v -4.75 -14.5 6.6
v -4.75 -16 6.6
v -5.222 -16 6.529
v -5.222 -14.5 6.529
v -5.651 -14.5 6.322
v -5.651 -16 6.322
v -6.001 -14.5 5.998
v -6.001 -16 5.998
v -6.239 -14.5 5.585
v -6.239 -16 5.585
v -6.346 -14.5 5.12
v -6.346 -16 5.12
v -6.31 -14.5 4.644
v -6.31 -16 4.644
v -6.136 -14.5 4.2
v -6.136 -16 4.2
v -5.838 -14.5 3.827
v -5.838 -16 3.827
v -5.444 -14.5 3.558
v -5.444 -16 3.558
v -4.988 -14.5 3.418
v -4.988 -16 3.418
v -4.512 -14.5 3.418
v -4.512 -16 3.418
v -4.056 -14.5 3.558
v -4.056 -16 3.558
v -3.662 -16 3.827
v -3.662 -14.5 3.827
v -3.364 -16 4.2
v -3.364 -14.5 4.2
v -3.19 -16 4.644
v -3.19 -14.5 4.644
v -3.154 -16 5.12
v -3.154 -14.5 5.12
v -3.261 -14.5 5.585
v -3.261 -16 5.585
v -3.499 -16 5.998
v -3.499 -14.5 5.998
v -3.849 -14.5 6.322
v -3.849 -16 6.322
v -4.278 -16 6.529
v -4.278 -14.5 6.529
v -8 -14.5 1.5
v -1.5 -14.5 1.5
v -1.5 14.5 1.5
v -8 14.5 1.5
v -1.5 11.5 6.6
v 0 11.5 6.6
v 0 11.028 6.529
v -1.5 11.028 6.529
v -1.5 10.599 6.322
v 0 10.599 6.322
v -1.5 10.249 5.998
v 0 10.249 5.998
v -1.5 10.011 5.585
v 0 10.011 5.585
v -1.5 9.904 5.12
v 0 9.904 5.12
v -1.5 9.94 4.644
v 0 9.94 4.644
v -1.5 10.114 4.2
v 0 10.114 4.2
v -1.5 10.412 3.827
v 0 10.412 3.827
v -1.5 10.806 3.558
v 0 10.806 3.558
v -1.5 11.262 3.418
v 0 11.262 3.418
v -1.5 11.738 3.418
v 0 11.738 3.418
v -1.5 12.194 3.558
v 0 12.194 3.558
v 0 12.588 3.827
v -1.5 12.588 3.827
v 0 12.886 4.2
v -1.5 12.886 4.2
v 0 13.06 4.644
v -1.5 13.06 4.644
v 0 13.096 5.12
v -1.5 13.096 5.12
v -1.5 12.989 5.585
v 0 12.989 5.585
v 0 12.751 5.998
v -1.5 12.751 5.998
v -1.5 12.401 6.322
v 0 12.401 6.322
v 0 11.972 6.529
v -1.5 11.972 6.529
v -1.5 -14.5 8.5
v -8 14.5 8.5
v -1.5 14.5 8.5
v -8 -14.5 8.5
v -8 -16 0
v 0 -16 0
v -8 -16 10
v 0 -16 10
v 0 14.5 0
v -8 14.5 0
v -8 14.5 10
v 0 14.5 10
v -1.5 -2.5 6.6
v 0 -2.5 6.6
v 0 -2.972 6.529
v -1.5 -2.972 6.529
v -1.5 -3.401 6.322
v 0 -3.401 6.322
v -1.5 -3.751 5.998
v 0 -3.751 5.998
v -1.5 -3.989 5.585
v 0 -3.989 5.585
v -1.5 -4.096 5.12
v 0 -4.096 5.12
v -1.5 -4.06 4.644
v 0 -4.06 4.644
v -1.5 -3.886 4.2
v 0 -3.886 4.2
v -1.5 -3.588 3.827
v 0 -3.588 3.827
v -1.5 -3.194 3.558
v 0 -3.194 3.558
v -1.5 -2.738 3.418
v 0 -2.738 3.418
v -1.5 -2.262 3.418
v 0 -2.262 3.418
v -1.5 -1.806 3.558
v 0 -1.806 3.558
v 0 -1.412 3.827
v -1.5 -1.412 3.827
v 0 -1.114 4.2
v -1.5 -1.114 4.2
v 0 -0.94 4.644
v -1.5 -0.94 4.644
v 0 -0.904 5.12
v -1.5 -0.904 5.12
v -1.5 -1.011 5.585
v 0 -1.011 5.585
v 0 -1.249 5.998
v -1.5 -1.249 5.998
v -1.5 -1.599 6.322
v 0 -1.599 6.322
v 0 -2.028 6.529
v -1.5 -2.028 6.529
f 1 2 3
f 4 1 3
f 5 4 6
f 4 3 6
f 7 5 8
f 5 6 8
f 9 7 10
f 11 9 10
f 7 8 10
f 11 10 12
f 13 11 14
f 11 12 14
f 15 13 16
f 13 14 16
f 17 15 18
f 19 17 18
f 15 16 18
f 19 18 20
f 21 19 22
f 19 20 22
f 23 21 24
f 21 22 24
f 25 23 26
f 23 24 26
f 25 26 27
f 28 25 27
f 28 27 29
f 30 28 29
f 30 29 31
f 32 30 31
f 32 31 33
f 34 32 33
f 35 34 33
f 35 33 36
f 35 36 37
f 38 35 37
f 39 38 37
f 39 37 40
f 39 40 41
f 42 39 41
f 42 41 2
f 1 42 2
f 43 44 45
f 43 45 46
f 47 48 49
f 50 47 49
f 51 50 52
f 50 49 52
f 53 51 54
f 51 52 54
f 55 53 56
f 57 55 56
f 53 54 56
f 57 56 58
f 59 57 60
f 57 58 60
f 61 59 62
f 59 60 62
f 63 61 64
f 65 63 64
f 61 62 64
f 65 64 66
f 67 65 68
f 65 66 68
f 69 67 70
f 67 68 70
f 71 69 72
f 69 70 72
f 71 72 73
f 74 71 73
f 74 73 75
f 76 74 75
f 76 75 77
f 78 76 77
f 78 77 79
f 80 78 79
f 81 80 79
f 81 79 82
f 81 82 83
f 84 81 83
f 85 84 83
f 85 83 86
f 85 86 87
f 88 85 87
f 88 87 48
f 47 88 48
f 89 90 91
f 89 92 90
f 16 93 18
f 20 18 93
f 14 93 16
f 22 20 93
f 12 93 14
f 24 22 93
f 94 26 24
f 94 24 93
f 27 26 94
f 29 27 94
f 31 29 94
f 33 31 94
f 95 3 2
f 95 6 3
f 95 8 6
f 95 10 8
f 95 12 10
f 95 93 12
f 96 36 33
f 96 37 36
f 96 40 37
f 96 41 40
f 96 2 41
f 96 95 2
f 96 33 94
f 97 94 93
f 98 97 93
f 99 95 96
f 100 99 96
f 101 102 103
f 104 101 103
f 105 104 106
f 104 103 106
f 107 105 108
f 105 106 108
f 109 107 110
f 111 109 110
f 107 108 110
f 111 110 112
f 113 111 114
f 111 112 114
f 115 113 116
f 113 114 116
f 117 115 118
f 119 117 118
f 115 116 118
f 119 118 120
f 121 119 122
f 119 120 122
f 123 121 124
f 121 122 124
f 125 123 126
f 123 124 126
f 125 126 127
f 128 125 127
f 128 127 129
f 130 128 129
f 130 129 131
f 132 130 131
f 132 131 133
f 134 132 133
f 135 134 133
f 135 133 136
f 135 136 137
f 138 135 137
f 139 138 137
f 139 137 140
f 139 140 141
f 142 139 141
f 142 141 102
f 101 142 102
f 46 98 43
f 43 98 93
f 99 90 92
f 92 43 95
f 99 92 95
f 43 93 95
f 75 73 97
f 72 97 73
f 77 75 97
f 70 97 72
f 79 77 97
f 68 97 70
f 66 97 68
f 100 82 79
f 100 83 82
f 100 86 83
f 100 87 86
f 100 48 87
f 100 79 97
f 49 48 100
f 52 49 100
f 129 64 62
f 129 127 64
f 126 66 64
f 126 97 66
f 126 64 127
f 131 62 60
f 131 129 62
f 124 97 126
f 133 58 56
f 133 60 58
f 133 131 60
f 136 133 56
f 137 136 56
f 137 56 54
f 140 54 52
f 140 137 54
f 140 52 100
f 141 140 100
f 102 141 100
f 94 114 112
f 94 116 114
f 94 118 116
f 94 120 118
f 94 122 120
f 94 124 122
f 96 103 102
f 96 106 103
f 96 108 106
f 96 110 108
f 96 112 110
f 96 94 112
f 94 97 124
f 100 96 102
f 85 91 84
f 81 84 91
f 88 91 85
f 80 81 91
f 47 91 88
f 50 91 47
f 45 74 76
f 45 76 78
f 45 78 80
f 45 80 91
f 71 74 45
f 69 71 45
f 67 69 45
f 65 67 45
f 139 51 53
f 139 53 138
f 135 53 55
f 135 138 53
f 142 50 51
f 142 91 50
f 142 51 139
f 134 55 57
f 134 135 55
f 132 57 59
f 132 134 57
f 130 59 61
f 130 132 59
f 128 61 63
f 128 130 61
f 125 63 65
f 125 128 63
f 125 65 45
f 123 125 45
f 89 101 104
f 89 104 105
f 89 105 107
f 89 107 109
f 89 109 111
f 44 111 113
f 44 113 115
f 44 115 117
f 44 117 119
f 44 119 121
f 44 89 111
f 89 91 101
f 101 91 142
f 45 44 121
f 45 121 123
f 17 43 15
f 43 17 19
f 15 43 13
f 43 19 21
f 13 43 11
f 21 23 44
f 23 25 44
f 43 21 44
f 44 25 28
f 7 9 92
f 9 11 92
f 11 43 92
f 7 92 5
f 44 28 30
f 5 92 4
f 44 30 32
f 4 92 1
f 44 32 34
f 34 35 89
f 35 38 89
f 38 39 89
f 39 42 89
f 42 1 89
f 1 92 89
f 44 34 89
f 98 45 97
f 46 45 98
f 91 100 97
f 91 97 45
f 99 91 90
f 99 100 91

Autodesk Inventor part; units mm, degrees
ref_plane "YZ Plane" through (0, 0, 0) normal (1, 0, 0) x (0, 1, 0)
ref_plane "XZ Plane" through (0, 0, 0) normal (0, 1, 0) x (-1, 0, 0)
ref_plane "XY Plane" through (0, 0, 0) normal (0, 0, 1) x (1, 0, 0)
sketch "Náčrt1" plane through (0, 0, 0) normal (0, 1, 0) x (-1, 0, 0)
  line L0 (0, -2) -> (0, 12) projected
  line L1 (-1.6, 0) -> (9.6, 0) projected
  line L2 (8, 10) -> (0, 10)
  line L3 (0, 10) -> (0, 0)
  line L4 (0, 0) -> (8, 0)
  line L5 (8, 0) -> (8, 10)
  line L6 (8, 8.5) -> (1.5, 8.5)
  line L7 (1.5, 8.5) -> (1.5, 1.5)
  line L8 (1.5, 1.5) -> (8, 1.5)
  line L9 (8, 1.5) -> (8, 8.5)
  point P0 (0, 0)
  point P1 (0, 10)
  dimension "d0" = 8
  dimension "d1" = 10
  dimension "d2" = 6.5
  dimension "d3" = 7
  dimension "d4" = 1.5
extrude "Vysunutí1" add sketch "Náčrt1" along normal mid plane 29 contours L0 L2 L5 L6 L7 L8 L1
sketch "Náčrt2" plane through (0, -14.5, 0) normal (0, -1, 0) x (1, 0, 0)
  line L0 (-8, 8.5) -> (-1.5, 8.5) projected
  line L1 (-1.5, 8.5) -> (-1.5, 1.5) projected
  line L2 (-1.5, 1.5) -> (-8, 1.5) projected
  line L3 (-8, 1.5) -> (-8, 0) projected
  line L4 (-8, 0) -> (0, 0) projected
  line L5 (0, 0) -> (0, 10) projected
  line L6 (0, 10) -> (-8, 10) projected
  line L7 (-8, 10) -> (-8, 8.5) projected
  line L8 (-8, 10) -> (0, 10)
  line L9 (0, 10) -> (0, 0)
  line L10 (0, 0) -> (-8, 0)
  line L11 (-8, 0) -> (-8, 10)
extrude "Vysunutí2" add sketch "Náčrt2" along normal blind 1.5
sketch "Náčrt3" plane through (0, -14.5, 0) normal (0, 1, 0) x (1, 0, 0)
  line L0 (-8, -8.5) -> (-1.5, -8.5) projected
  line L1 (-1.5, -8.5) -> (-1.5, -1.5) projected
  line L2 (-1.5, -1.5) -> (-8, -1.5) projected
  line L3 (-8, -8.5) -> (-8, -1.5) projected
  point P0 (0, 0)
  point P1 (-4.75, -5)
  dimension "d9" = 3.25
  dimension "d10" = 3.5
hole "Díra1" at (-4.75, -14.5, 5) direction (0, -1, 0) diameter 3.2 end through all
sketch "Náčrt4" plane through (-1.5, 14.5, 1.5) normal (-1, 0, 0) x (0, 0, 1)
  line L0 (0, 0) -> (7, 0) projected
  line L1 (7, 0) -> (7, -29) projected
  line L2 (0, 0) -> (7, 0) projected
  line L3 (0, -29) -> (0, 0) projected
  line L4 (7, -29) -> (0, -29) projected
  point P0 (-1.5, -14.5)
  point P1 (3.5, -3)
  point P2 (3.5, -17)
  point P3 (3.5, 0)
  dimension "d18" = 3
  dimension "d19" = 14
  dimension "d20" = 3.5
  dimension "d21" = 3.5
hole "Díra2" at (-1.5, 11.5, 5) at (-1.5, -2.5, 5) direction (1, 0, 0) diameter 3.2 end through all
properties part number "lift_tab_bracket" material "Hliník 6061"
